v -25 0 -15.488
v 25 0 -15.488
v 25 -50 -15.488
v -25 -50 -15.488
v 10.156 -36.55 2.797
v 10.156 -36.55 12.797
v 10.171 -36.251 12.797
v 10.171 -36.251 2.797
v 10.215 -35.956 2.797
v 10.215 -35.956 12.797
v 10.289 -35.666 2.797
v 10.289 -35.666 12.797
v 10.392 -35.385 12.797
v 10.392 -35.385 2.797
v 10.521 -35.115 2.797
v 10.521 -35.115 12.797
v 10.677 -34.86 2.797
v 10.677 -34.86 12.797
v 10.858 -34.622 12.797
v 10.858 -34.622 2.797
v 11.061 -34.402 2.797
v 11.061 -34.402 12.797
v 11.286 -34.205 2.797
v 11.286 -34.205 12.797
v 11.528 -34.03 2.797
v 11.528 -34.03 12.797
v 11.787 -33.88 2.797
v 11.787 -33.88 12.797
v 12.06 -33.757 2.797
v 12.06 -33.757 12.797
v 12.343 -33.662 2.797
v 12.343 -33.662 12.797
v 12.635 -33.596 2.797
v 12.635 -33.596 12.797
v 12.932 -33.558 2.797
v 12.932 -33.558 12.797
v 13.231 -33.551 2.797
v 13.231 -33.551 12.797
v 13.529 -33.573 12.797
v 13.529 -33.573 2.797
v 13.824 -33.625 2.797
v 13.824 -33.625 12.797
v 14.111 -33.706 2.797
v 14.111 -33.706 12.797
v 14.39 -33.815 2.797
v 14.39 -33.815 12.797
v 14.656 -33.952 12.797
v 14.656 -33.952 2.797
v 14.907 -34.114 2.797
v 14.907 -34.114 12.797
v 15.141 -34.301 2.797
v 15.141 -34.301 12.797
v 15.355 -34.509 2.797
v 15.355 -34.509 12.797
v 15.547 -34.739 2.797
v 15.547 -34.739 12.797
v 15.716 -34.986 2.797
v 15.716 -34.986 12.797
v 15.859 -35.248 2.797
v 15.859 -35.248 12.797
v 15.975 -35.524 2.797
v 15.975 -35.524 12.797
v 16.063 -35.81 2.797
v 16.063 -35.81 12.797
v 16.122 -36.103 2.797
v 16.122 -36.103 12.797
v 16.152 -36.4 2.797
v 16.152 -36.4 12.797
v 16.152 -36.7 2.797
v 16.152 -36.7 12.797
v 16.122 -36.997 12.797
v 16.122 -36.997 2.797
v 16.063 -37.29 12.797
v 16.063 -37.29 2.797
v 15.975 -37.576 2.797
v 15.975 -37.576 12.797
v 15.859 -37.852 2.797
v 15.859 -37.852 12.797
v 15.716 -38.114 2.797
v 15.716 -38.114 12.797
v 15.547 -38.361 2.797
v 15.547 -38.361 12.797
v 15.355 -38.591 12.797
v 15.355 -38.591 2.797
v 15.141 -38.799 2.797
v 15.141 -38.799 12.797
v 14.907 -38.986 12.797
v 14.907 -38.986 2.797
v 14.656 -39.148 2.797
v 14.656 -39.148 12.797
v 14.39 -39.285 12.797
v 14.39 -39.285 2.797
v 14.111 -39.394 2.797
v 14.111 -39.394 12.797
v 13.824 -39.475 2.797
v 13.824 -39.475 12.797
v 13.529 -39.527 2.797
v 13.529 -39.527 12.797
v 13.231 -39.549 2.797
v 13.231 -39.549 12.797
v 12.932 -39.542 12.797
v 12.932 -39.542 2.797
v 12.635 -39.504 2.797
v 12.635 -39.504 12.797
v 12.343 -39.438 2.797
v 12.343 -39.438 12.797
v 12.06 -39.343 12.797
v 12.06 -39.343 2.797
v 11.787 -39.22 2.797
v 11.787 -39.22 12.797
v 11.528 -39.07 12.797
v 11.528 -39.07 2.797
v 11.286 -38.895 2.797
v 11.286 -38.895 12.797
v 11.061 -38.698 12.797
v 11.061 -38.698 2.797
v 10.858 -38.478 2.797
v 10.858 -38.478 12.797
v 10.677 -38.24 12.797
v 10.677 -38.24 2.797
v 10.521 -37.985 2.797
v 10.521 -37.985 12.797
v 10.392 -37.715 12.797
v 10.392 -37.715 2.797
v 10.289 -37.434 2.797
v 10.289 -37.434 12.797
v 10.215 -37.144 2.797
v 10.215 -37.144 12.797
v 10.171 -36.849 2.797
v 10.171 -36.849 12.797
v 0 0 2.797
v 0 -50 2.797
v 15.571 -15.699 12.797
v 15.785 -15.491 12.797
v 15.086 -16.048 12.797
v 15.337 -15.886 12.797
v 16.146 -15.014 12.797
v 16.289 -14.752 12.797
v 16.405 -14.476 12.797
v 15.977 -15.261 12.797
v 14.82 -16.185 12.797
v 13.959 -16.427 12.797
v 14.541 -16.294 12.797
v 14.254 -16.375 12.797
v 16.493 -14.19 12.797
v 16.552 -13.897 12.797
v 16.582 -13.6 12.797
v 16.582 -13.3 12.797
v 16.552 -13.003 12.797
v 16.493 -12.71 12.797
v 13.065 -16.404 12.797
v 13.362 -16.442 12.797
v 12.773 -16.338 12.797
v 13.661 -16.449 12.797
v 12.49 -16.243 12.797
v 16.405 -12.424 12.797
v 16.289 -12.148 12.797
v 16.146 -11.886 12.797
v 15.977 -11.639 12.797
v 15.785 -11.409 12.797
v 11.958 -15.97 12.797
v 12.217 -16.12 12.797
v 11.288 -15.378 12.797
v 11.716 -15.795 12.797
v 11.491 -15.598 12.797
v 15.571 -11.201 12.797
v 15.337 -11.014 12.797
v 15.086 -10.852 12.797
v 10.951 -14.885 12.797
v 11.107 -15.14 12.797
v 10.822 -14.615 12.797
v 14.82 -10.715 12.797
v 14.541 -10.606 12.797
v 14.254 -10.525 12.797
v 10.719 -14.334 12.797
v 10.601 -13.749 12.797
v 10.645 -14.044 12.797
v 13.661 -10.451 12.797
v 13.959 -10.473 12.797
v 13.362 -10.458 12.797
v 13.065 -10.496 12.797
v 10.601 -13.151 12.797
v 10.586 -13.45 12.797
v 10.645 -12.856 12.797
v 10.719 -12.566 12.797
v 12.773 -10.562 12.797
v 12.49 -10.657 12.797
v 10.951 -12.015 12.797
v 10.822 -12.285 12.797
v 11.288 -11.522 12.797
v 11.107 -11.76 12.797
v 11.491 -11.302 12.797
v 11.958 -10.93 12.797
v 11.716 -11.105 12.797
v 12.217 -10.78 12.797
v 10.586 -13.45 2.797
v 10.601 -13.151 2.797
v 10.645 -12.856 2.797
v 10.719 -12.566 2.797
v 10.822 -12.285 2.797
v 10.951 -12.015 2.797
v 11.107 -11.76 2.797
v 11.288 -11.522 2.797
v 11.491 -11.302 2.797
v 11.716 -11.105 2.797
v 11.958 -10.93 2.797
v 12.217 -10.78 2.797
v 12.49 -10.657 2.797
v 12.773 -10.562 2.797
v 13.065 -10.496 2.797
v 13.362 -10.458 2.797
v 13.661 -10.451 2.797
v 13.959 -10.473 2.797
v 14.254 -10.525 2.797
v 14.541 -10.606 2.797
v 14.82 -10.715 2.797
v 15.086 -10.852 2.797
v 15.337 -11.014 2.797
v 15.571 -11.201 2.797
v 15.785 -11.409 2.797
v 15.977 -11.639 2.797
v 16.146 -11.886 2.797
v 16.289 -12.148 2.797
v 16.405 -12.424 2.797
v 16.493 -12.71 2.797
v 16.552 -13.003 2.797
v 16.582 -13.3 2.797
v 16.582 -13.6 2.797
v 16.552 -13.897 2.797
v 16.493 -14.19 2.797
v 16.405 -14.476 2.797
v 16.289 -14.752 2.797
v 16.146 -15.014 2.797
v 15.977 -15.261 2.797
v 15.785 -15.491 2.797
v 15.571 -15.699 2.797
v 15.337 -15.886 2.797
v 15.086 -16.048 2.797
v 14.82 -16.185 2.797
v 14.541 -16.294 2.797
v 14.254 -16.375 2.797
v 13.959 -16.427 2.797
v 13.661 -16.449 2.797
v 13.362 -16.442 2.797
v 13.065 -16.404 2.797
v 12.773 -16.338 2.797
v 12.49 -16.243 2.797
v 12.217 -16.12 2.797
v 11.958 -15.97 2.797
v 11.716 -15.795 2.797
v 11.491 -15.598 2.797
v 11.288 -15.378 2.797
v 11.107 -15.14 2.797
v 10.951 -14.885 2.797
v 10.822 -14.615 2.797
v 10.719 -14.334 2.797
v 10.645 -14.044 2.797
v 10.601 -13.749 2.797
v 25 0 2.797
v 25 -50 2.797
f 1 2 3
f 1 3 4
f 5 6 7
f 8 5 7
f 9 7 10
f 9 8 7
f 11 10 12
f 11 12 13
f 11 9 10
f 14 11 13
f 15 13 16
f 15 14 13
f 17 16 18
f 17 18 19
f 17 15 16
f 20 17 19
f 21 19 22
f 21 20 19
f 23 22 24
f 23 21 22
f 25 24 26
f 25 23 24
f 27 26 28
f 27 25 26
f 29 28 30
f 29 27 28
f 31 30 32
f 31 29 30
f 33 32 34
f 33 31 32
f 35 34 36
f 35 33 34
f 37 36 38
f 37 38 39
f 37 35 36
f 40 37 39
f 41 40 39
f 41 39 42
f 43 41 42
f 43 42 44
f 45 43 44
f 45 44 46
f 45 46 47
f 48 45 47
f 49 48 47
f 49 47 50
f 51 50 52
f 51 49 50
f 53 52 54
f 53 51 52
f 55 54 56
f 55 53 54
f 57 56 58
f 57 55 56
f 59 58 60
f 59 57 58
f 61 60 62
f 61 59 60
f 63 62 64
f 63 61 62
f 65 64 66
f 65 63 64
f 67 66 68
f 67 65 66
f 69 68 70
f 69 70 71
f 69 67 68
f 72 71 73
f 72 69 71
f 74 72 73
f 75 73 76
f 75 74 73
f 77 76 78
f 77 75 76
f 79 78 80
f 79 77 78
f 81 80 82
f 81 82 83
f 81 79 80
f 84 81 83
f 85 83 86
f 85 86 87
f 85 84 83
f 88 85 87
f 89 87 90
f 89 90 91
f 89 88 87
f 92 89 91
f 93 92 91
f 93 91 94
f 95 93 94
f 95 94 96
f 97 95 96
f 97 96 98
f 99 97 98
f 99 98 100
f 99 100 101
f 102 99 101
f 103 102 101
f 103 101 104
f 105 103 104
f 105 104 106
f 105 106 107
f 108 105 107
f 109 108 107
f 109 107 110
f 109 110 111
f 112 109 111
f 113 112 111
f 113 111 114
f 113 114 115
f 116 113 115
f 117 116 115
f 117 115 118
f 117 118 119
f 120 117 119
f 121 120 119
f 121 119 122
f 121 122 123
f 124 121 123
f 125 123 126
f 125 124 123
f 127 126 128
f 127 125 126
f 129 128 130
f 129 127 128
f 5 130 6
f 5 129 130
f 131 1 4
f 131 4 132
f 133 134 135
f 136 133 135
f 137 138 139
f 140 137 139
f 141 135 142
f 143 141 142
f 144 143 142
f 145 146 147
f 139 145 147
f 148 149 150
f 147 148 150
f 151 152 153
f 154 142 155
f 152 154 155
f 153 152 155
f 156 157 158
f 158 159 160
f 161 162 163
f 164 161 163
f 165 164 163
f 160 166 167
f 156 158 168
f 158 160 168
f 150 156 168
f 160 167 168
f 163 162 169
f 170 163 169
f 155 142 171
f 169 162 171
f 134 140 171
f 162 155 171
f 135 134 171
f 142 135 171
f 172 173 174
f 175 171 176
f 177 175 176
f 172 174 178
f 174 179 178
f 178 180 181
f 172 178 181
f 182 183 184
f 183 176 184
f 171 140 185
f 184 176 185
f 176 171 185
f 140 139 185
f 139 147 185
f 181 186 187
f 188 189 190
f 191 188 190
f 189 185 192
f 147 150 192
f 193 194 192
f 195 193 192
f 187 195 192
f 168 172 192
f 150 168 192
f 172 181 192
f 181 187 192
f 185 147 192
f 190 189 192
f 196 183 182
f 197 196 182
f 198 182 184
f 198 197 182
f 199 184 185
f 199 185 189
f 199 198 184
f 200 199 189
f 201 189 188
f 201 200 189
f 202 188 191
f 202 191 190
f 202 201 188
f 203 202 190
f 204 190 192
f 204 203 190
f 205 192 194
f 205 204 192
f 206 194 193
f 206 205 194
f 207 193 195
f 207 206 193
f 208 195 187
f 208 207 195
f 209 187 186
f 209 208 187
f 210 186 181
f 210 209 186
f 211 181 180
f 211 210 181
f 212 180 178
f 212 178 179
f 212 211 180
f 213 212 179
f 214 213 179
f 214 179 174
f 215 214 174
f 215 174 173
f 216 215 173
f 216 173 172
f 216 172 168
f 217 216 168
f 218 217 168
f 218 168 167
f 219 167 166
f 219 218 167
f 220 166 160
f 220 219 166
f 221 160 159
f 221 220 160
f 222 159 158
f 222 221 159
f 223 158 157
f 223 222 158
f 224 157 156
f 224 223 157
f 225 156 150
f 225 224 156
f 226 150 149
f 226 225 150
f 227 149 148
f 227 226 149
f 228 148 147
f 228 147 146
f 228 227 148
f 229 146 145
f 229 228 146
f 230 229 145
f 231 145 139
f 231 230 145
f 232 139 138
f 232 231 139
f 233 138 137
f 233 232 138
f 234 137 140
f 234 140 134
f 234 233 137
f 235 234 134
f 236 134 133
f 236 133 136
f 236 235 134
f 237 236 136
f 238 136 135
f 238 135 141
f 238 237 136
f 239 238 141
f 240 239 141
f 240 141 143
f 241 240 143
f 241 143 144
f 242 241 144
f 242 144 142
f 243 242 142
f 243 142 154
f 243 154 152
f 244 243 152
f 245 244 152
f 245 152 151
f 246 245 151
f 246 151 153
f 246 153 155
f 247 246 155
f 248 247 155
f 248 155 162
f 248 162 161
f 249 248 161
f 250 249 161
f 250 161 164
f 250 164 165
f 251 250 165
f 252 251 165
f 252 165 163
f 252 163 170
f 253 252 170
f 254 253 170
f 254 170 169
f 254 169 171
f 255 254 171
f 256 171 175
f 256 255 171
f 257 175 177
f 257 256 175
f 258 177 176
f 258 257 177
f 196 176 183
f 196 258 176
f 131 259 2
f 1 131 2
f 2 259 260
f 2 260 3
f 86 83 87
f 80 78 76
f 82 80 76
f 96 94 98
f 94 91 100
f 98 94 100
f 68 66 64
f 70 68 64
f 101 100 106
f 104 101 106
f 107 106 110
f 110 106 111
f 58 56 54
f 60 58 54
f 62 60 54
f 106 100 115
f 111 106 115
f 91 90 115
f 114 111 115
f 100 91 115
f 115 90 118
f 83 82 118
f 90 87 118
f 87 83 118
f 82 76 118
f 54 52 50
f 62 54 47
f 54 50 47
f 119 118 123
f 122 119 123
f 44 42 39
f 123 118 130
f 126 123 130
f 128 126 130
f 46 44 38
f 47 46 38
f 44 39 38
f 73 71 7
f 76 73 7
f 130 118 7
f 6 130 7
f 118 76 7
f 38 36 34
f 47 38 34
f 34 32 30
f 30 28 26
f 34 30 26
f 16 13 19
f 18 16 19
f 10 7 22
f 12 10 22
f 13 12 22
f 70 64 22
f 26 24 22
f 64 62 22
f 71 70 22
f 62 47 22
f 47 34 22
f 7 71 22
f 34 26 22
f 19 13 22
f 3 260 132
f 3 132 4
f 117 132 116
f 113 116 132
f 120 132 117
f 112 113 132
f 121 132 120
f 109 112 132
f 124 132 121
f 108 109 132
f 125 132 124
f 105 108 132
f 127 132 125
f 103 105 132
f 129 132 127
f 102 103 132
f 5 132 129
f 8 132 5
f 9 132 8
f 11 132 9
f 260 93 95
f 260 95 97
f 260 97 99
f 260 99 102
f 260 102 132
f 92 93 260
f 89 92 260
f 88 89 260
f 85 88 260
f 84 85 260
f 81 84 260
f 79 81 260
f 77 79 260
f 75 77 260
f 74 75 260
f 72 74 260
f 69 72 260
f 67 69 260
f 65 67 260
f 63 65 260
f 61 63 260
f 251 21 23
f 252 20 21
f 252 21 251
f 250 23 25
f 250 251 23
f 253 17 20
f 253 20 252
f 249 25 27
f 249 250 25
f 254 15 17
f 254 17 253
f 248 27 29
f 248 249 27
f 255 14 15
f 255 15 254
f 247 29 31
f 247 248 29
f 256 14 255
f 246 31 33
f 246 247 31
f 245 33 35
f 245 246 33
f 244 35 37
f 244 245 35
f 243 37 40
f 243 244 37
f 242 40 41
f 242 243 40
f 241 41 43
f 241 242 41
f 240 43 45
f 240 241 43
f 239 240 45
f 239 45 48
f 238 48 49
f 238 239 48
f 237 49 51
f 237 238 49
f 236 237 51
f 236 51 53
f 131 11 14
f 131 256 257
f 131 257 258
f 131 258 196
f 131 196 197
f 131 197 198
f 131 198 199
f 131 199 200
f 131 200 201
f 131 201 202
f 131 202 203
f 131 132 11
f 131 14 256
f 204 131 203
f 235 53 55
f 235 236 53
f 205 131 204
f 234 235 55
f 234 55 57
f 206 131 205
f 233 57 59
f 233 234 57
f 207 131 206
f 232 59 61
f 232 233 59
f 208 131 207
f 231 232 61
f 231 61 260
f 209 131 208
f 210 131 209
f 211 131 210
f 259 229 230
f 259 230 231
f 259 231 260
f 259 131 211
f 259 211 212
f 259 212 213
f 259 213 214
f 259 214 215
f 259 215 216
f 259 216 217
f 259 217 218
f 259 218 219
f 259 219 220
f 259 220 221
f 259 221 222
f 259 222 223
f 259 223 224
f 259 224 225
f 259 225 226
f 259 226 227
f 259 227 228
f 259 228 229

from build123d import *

# Parameters (mm, degrees)
F1_DEPTH = 50
F2_R     = 3
F3_DEPTH = 10


with BuildPart() as f1:
    # F0 (on Front) → F1 (new body)
    with BuildSketch(Plane.XZ):
        Polygon((-25, 2.796772), (-25, -15.488228), (25, -15.488228), (0, 2.796772), align=None)
    extrude(amount=F1_DEPTH)

    # F2 (on face) → F3 (join)
    with BuildSketch(Plane.XY.offset(2.796772)):
        with Locations((-13.586, -13.45)):
            Circle(F2_R)
        with Locations((-13.156, -36.55)):
            Circle(F2_R)
    extrude(amount=F3_DEPTH)


with BuildPart() as f4_1:
    # F4: instance of F1
    add(f1.part.mirror(Plane.YZ))


solid = f4_1.part
